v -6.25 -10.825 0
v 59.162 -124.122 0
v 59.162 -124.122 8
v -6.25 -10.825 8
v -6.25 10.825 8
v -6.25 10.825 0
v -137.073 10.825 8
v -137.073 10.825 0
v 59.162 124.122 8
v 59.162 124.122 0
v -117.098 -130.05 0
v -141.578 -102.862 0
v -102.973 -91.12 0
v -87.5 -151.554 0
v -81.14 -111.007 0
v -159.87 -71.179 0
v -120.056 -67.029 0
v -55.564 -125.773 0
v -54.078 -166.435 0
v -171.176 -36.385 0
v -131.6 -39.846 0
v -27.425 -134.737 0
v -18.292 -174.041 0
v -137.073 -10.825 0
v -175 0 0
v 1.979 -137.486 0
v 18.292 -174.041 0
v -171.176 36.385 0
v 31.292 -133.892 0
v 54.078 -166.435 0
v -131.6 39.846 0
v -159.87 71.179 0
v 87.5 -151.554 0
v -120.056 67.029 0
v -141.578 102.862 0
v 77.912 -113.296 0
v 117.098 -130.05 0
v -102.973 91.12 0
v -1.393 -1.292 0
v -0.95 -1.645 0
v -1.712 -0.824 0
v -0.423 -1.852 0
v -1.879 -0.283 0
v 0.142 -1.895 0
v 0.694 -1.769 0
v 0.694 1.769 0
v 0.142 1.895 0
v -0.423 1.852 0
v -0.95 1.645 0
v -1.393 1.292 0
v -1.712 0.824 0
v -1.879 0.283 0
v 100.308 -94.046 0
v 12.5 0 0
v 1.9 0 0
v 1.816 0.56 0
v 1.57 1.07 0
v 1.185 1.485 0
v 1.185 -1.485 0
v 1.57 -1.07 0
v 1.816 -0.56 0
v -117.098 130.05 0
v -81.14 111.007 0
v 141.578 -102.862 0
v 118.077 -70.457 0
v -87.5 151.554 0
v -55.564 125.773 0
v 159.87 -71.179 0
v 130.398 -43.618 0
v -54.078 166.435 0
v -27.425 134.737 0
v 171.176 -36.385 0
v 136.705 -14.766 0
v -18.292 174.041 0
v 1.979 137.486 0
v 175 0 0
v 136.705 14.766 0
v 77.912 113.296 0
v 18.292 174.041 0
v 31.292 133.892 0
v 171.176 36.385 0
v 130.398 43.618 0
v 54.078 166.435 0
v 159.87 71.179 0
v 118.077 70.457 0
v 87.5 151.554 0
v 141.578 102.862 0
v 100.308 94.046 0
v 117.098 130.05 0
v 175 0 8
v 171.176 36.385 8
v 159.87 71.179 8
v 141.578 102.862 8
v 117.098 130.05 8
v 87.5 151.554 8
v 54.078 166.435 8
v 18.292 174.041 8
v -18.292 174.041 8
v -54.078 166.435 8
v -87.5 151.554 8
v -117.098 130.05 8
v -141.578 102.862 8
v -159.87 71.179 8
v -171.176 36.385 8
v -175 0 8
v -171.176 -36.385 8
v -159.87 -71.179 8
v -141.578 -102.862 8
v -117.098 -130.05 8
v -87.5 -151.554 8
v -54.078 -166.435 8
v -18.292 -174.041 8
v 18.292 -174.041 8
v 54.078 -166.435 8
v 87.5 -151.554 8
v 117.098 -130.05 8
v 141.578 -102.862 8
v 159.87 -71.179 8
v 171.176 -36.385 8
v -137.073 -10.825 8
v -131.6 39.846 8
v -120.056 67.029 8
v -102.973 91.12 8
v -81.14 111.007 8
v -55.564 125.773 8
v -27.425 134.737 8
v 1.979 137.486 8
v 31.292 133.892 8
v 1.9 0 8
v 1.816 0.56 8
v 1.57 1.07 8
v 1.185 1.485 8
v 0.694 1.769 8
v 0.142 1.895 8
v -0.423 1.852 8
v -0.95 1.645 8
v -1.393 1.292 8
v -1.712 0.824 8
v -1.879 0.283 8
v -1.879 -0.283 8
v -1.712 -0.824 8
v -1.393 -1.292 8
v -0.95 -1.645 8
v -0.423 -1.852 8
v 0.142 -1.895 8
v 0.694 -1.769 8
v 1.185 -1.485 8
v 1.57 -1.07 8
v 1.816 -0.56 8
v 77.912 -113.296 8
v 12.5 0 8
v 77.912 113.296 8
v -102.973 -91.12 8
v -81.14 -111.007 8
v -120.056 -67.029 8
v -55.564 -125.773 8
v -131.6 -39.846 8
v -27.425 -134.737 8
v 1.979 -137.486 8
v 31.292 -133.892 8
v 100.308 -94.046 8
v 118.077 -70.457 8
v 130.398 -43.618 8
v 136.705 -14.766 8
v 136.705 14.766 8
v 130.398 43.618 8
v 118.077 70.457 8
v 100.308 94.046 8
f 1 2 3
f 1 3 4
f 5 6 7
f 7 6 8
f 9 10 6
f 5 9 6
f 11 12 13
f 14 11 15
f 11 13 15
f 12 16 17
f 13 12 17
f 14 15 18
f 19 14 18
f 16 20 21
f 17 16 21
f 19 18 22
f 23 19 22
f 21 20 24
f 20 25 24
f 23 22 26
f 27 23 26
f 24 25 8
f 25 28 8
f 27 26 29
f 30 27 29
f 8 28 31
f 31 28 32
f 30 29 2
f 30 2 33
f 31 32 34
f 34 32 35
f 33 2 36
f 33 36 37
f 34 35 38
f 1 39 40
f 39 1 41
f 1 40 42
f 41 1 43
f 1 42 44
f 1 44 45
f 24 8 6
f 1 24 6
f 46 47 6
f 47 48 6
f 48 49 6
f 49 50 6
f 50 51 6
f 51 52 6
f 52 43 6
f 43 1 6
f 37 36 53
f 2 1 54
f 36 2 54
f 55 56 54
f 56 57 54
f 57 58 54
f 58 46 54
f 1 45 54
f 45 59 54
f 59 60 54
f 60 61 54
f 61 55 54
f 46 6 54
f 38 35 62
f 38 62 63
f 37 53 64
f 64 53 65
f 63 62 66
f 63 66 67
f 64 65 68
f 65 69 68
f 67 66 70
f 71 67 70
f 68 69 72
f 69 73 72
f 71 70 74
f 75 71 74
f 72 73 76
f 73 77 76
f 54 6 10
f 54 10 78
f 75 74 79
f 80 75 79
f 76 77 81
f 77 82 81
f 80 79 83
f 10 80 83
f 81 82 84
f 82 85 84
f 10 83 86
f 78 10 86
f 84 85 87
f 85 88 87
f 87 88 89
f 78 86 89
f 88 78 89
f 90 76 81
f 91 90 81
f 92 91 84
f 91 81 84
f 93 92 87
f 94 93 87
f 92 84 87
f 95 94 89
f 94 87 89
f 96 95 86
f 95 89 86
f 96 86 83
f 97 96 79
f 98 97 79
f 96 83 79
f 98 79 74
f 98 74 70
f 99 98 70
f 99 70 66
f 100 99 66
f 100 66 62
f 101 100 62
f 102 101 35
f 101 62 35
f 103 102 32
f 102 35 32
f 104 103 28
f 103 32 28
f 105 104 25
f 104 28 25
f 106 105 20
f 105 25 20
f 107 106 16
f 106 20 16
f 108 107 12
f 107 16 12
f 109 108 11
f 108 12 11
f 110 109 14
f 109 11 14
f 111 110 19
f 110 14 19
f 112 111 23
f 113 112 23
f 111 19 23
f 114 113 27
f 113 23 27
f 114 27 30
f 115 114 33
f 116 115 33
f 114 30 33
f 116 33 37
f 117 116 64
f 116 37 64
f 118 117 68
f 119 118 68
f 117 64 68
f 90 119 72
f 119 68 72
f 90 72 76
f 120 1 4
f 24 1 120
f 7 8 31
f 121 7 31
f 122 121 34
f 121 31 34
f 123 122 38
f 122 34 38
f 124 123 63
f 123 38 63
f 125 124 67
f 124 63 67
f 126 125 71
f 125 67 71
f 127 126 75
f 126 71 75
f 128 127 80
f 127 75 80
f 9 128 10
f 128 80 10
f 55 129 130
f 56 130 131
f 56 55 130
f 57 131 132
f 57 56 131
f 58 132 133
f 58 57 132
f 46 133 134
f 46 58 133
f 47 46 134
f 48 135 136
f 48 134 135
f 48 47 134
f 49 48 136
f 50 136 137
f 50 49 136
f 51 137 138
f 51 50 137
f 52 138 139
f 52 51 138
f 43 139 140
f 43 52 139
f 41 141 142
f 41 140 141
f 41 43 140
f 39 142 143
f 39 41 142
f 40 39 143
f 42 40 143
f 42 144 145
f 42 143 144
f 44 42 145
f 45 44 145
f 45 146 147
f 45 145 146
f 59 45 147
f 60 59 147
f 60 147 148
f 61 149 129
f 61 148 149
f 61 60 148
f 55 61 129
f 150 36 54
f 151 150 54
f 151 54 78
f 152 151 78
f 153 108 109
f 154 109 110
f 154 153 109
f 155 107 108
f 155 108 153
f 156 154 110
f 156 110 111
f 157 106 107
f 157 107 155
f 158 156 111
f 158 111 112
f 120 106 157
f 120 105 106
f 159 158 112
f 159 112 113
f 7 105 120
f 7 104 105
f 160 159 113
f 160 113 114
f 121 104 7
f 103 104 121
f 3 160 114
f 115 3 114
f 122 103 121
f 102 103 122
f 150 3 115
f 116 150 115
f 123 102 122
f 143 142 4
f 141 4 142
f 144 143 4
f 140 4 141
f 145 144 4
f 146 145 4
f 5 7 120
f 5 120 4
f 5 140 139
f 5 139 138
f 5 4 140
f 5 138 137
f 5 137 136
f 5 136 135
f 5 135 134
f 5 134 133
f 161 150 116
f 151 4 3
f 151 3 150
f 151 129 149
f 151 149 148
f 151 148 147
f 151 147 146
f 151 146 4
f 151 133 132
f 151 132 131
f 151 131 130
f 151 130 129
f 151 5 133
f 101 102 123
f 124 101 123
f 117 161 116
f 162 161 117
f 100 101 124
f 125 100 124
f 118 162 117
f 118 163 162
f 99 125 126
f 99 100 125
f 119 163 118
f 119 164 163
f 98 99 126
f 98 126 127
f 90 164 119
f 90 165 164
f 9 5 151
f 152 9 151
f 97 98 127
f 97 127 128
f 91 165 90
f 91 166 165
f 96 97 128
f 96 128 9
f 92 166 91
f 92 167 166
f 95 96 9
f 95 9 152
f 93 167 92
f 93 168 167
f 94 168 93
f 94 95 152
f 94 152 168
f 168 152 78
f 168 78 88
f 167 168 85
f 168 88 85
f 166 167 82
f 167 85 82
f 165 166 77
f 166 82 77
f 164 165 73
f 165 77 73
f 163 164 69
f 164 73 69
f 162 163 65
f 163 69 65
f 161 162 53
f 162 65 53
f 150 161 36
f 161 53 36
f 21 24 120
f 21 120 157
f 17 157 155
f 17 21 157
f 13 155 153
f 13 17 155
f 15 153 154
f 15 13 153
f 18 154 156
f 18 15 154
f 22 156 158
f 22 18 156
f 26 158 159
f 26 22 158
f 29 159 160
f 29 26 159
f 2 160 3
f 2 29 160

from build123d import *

# Parameters (mm, degrees)
SKETCH1_R               = 175
BOSS_EXTRUDE1_DEPTH     = 8
SKETCH2_R               = 1.9
CUT_EXTRUDE2_DEPTH      = 9
CUT_EXTRUDE2_DEPTH_BACK = 1


with BuildPart() as part:
    # Sketch1 → Boss-Extrude1 (new body)
    with BuildSketch(Plane.XY):
        Circle(SKETCH1_R)
        with BuildLine():
            Line((-6.25, 10.825317547), (-137.073201247, 10.825317547))
            ThreePointArc((-137.073201247, 10.825317547), (-68.75, 119.07849302), (59.161600623, 124.121533231))
            Line((59.161600623, 124.121533231), (-6.25, 10.825317547))
        make_face(mode=Mode.SUBTRACT)
        with BuildLine():
            Line((-6.25, -10.825317547), (-137.073201247, -10.825317547))
            ThreePointArc((-137.073201247, -10.825317547), (-68.75, -119.07849302), (59.161600623, -124.121533231))
            Line((59.161600623, -124.121533231), (-6.25, -10.825317547))
        make_face(mode=Mode.SUBTRACT)
        with BuildLine():
            Line((12.5, 0), (77.911600623, 113.296215684))
            ThreePointArc((77.911600623, 113.296215684), (137.5, 0), (77.911600623, -113.296215684))
            Line((77.911600623, -113.296215684), (12.5, 0))
        make_face(mode=Mode.SUBTRACT)
    extrude(amount=BOSS_EXTRUDE1_DEPTH)

    # Sketch2 → Cut-Extrude2 (cut, two sides)
    with BuildSketch(Plane.XY) as cut_extrude2_sk:
        Circle(SKETCH2_R)
    extrude(amount=CUT_EXTRUDE2_DEPTH, mode=Mode.SUBTRACT)
    extrude(cut_extrude2_sk.sketch, amount=-CUT_EXTRUDE2_DEPTH_BACK, mode=Mode.SUBTRACT)


solid = part.part
